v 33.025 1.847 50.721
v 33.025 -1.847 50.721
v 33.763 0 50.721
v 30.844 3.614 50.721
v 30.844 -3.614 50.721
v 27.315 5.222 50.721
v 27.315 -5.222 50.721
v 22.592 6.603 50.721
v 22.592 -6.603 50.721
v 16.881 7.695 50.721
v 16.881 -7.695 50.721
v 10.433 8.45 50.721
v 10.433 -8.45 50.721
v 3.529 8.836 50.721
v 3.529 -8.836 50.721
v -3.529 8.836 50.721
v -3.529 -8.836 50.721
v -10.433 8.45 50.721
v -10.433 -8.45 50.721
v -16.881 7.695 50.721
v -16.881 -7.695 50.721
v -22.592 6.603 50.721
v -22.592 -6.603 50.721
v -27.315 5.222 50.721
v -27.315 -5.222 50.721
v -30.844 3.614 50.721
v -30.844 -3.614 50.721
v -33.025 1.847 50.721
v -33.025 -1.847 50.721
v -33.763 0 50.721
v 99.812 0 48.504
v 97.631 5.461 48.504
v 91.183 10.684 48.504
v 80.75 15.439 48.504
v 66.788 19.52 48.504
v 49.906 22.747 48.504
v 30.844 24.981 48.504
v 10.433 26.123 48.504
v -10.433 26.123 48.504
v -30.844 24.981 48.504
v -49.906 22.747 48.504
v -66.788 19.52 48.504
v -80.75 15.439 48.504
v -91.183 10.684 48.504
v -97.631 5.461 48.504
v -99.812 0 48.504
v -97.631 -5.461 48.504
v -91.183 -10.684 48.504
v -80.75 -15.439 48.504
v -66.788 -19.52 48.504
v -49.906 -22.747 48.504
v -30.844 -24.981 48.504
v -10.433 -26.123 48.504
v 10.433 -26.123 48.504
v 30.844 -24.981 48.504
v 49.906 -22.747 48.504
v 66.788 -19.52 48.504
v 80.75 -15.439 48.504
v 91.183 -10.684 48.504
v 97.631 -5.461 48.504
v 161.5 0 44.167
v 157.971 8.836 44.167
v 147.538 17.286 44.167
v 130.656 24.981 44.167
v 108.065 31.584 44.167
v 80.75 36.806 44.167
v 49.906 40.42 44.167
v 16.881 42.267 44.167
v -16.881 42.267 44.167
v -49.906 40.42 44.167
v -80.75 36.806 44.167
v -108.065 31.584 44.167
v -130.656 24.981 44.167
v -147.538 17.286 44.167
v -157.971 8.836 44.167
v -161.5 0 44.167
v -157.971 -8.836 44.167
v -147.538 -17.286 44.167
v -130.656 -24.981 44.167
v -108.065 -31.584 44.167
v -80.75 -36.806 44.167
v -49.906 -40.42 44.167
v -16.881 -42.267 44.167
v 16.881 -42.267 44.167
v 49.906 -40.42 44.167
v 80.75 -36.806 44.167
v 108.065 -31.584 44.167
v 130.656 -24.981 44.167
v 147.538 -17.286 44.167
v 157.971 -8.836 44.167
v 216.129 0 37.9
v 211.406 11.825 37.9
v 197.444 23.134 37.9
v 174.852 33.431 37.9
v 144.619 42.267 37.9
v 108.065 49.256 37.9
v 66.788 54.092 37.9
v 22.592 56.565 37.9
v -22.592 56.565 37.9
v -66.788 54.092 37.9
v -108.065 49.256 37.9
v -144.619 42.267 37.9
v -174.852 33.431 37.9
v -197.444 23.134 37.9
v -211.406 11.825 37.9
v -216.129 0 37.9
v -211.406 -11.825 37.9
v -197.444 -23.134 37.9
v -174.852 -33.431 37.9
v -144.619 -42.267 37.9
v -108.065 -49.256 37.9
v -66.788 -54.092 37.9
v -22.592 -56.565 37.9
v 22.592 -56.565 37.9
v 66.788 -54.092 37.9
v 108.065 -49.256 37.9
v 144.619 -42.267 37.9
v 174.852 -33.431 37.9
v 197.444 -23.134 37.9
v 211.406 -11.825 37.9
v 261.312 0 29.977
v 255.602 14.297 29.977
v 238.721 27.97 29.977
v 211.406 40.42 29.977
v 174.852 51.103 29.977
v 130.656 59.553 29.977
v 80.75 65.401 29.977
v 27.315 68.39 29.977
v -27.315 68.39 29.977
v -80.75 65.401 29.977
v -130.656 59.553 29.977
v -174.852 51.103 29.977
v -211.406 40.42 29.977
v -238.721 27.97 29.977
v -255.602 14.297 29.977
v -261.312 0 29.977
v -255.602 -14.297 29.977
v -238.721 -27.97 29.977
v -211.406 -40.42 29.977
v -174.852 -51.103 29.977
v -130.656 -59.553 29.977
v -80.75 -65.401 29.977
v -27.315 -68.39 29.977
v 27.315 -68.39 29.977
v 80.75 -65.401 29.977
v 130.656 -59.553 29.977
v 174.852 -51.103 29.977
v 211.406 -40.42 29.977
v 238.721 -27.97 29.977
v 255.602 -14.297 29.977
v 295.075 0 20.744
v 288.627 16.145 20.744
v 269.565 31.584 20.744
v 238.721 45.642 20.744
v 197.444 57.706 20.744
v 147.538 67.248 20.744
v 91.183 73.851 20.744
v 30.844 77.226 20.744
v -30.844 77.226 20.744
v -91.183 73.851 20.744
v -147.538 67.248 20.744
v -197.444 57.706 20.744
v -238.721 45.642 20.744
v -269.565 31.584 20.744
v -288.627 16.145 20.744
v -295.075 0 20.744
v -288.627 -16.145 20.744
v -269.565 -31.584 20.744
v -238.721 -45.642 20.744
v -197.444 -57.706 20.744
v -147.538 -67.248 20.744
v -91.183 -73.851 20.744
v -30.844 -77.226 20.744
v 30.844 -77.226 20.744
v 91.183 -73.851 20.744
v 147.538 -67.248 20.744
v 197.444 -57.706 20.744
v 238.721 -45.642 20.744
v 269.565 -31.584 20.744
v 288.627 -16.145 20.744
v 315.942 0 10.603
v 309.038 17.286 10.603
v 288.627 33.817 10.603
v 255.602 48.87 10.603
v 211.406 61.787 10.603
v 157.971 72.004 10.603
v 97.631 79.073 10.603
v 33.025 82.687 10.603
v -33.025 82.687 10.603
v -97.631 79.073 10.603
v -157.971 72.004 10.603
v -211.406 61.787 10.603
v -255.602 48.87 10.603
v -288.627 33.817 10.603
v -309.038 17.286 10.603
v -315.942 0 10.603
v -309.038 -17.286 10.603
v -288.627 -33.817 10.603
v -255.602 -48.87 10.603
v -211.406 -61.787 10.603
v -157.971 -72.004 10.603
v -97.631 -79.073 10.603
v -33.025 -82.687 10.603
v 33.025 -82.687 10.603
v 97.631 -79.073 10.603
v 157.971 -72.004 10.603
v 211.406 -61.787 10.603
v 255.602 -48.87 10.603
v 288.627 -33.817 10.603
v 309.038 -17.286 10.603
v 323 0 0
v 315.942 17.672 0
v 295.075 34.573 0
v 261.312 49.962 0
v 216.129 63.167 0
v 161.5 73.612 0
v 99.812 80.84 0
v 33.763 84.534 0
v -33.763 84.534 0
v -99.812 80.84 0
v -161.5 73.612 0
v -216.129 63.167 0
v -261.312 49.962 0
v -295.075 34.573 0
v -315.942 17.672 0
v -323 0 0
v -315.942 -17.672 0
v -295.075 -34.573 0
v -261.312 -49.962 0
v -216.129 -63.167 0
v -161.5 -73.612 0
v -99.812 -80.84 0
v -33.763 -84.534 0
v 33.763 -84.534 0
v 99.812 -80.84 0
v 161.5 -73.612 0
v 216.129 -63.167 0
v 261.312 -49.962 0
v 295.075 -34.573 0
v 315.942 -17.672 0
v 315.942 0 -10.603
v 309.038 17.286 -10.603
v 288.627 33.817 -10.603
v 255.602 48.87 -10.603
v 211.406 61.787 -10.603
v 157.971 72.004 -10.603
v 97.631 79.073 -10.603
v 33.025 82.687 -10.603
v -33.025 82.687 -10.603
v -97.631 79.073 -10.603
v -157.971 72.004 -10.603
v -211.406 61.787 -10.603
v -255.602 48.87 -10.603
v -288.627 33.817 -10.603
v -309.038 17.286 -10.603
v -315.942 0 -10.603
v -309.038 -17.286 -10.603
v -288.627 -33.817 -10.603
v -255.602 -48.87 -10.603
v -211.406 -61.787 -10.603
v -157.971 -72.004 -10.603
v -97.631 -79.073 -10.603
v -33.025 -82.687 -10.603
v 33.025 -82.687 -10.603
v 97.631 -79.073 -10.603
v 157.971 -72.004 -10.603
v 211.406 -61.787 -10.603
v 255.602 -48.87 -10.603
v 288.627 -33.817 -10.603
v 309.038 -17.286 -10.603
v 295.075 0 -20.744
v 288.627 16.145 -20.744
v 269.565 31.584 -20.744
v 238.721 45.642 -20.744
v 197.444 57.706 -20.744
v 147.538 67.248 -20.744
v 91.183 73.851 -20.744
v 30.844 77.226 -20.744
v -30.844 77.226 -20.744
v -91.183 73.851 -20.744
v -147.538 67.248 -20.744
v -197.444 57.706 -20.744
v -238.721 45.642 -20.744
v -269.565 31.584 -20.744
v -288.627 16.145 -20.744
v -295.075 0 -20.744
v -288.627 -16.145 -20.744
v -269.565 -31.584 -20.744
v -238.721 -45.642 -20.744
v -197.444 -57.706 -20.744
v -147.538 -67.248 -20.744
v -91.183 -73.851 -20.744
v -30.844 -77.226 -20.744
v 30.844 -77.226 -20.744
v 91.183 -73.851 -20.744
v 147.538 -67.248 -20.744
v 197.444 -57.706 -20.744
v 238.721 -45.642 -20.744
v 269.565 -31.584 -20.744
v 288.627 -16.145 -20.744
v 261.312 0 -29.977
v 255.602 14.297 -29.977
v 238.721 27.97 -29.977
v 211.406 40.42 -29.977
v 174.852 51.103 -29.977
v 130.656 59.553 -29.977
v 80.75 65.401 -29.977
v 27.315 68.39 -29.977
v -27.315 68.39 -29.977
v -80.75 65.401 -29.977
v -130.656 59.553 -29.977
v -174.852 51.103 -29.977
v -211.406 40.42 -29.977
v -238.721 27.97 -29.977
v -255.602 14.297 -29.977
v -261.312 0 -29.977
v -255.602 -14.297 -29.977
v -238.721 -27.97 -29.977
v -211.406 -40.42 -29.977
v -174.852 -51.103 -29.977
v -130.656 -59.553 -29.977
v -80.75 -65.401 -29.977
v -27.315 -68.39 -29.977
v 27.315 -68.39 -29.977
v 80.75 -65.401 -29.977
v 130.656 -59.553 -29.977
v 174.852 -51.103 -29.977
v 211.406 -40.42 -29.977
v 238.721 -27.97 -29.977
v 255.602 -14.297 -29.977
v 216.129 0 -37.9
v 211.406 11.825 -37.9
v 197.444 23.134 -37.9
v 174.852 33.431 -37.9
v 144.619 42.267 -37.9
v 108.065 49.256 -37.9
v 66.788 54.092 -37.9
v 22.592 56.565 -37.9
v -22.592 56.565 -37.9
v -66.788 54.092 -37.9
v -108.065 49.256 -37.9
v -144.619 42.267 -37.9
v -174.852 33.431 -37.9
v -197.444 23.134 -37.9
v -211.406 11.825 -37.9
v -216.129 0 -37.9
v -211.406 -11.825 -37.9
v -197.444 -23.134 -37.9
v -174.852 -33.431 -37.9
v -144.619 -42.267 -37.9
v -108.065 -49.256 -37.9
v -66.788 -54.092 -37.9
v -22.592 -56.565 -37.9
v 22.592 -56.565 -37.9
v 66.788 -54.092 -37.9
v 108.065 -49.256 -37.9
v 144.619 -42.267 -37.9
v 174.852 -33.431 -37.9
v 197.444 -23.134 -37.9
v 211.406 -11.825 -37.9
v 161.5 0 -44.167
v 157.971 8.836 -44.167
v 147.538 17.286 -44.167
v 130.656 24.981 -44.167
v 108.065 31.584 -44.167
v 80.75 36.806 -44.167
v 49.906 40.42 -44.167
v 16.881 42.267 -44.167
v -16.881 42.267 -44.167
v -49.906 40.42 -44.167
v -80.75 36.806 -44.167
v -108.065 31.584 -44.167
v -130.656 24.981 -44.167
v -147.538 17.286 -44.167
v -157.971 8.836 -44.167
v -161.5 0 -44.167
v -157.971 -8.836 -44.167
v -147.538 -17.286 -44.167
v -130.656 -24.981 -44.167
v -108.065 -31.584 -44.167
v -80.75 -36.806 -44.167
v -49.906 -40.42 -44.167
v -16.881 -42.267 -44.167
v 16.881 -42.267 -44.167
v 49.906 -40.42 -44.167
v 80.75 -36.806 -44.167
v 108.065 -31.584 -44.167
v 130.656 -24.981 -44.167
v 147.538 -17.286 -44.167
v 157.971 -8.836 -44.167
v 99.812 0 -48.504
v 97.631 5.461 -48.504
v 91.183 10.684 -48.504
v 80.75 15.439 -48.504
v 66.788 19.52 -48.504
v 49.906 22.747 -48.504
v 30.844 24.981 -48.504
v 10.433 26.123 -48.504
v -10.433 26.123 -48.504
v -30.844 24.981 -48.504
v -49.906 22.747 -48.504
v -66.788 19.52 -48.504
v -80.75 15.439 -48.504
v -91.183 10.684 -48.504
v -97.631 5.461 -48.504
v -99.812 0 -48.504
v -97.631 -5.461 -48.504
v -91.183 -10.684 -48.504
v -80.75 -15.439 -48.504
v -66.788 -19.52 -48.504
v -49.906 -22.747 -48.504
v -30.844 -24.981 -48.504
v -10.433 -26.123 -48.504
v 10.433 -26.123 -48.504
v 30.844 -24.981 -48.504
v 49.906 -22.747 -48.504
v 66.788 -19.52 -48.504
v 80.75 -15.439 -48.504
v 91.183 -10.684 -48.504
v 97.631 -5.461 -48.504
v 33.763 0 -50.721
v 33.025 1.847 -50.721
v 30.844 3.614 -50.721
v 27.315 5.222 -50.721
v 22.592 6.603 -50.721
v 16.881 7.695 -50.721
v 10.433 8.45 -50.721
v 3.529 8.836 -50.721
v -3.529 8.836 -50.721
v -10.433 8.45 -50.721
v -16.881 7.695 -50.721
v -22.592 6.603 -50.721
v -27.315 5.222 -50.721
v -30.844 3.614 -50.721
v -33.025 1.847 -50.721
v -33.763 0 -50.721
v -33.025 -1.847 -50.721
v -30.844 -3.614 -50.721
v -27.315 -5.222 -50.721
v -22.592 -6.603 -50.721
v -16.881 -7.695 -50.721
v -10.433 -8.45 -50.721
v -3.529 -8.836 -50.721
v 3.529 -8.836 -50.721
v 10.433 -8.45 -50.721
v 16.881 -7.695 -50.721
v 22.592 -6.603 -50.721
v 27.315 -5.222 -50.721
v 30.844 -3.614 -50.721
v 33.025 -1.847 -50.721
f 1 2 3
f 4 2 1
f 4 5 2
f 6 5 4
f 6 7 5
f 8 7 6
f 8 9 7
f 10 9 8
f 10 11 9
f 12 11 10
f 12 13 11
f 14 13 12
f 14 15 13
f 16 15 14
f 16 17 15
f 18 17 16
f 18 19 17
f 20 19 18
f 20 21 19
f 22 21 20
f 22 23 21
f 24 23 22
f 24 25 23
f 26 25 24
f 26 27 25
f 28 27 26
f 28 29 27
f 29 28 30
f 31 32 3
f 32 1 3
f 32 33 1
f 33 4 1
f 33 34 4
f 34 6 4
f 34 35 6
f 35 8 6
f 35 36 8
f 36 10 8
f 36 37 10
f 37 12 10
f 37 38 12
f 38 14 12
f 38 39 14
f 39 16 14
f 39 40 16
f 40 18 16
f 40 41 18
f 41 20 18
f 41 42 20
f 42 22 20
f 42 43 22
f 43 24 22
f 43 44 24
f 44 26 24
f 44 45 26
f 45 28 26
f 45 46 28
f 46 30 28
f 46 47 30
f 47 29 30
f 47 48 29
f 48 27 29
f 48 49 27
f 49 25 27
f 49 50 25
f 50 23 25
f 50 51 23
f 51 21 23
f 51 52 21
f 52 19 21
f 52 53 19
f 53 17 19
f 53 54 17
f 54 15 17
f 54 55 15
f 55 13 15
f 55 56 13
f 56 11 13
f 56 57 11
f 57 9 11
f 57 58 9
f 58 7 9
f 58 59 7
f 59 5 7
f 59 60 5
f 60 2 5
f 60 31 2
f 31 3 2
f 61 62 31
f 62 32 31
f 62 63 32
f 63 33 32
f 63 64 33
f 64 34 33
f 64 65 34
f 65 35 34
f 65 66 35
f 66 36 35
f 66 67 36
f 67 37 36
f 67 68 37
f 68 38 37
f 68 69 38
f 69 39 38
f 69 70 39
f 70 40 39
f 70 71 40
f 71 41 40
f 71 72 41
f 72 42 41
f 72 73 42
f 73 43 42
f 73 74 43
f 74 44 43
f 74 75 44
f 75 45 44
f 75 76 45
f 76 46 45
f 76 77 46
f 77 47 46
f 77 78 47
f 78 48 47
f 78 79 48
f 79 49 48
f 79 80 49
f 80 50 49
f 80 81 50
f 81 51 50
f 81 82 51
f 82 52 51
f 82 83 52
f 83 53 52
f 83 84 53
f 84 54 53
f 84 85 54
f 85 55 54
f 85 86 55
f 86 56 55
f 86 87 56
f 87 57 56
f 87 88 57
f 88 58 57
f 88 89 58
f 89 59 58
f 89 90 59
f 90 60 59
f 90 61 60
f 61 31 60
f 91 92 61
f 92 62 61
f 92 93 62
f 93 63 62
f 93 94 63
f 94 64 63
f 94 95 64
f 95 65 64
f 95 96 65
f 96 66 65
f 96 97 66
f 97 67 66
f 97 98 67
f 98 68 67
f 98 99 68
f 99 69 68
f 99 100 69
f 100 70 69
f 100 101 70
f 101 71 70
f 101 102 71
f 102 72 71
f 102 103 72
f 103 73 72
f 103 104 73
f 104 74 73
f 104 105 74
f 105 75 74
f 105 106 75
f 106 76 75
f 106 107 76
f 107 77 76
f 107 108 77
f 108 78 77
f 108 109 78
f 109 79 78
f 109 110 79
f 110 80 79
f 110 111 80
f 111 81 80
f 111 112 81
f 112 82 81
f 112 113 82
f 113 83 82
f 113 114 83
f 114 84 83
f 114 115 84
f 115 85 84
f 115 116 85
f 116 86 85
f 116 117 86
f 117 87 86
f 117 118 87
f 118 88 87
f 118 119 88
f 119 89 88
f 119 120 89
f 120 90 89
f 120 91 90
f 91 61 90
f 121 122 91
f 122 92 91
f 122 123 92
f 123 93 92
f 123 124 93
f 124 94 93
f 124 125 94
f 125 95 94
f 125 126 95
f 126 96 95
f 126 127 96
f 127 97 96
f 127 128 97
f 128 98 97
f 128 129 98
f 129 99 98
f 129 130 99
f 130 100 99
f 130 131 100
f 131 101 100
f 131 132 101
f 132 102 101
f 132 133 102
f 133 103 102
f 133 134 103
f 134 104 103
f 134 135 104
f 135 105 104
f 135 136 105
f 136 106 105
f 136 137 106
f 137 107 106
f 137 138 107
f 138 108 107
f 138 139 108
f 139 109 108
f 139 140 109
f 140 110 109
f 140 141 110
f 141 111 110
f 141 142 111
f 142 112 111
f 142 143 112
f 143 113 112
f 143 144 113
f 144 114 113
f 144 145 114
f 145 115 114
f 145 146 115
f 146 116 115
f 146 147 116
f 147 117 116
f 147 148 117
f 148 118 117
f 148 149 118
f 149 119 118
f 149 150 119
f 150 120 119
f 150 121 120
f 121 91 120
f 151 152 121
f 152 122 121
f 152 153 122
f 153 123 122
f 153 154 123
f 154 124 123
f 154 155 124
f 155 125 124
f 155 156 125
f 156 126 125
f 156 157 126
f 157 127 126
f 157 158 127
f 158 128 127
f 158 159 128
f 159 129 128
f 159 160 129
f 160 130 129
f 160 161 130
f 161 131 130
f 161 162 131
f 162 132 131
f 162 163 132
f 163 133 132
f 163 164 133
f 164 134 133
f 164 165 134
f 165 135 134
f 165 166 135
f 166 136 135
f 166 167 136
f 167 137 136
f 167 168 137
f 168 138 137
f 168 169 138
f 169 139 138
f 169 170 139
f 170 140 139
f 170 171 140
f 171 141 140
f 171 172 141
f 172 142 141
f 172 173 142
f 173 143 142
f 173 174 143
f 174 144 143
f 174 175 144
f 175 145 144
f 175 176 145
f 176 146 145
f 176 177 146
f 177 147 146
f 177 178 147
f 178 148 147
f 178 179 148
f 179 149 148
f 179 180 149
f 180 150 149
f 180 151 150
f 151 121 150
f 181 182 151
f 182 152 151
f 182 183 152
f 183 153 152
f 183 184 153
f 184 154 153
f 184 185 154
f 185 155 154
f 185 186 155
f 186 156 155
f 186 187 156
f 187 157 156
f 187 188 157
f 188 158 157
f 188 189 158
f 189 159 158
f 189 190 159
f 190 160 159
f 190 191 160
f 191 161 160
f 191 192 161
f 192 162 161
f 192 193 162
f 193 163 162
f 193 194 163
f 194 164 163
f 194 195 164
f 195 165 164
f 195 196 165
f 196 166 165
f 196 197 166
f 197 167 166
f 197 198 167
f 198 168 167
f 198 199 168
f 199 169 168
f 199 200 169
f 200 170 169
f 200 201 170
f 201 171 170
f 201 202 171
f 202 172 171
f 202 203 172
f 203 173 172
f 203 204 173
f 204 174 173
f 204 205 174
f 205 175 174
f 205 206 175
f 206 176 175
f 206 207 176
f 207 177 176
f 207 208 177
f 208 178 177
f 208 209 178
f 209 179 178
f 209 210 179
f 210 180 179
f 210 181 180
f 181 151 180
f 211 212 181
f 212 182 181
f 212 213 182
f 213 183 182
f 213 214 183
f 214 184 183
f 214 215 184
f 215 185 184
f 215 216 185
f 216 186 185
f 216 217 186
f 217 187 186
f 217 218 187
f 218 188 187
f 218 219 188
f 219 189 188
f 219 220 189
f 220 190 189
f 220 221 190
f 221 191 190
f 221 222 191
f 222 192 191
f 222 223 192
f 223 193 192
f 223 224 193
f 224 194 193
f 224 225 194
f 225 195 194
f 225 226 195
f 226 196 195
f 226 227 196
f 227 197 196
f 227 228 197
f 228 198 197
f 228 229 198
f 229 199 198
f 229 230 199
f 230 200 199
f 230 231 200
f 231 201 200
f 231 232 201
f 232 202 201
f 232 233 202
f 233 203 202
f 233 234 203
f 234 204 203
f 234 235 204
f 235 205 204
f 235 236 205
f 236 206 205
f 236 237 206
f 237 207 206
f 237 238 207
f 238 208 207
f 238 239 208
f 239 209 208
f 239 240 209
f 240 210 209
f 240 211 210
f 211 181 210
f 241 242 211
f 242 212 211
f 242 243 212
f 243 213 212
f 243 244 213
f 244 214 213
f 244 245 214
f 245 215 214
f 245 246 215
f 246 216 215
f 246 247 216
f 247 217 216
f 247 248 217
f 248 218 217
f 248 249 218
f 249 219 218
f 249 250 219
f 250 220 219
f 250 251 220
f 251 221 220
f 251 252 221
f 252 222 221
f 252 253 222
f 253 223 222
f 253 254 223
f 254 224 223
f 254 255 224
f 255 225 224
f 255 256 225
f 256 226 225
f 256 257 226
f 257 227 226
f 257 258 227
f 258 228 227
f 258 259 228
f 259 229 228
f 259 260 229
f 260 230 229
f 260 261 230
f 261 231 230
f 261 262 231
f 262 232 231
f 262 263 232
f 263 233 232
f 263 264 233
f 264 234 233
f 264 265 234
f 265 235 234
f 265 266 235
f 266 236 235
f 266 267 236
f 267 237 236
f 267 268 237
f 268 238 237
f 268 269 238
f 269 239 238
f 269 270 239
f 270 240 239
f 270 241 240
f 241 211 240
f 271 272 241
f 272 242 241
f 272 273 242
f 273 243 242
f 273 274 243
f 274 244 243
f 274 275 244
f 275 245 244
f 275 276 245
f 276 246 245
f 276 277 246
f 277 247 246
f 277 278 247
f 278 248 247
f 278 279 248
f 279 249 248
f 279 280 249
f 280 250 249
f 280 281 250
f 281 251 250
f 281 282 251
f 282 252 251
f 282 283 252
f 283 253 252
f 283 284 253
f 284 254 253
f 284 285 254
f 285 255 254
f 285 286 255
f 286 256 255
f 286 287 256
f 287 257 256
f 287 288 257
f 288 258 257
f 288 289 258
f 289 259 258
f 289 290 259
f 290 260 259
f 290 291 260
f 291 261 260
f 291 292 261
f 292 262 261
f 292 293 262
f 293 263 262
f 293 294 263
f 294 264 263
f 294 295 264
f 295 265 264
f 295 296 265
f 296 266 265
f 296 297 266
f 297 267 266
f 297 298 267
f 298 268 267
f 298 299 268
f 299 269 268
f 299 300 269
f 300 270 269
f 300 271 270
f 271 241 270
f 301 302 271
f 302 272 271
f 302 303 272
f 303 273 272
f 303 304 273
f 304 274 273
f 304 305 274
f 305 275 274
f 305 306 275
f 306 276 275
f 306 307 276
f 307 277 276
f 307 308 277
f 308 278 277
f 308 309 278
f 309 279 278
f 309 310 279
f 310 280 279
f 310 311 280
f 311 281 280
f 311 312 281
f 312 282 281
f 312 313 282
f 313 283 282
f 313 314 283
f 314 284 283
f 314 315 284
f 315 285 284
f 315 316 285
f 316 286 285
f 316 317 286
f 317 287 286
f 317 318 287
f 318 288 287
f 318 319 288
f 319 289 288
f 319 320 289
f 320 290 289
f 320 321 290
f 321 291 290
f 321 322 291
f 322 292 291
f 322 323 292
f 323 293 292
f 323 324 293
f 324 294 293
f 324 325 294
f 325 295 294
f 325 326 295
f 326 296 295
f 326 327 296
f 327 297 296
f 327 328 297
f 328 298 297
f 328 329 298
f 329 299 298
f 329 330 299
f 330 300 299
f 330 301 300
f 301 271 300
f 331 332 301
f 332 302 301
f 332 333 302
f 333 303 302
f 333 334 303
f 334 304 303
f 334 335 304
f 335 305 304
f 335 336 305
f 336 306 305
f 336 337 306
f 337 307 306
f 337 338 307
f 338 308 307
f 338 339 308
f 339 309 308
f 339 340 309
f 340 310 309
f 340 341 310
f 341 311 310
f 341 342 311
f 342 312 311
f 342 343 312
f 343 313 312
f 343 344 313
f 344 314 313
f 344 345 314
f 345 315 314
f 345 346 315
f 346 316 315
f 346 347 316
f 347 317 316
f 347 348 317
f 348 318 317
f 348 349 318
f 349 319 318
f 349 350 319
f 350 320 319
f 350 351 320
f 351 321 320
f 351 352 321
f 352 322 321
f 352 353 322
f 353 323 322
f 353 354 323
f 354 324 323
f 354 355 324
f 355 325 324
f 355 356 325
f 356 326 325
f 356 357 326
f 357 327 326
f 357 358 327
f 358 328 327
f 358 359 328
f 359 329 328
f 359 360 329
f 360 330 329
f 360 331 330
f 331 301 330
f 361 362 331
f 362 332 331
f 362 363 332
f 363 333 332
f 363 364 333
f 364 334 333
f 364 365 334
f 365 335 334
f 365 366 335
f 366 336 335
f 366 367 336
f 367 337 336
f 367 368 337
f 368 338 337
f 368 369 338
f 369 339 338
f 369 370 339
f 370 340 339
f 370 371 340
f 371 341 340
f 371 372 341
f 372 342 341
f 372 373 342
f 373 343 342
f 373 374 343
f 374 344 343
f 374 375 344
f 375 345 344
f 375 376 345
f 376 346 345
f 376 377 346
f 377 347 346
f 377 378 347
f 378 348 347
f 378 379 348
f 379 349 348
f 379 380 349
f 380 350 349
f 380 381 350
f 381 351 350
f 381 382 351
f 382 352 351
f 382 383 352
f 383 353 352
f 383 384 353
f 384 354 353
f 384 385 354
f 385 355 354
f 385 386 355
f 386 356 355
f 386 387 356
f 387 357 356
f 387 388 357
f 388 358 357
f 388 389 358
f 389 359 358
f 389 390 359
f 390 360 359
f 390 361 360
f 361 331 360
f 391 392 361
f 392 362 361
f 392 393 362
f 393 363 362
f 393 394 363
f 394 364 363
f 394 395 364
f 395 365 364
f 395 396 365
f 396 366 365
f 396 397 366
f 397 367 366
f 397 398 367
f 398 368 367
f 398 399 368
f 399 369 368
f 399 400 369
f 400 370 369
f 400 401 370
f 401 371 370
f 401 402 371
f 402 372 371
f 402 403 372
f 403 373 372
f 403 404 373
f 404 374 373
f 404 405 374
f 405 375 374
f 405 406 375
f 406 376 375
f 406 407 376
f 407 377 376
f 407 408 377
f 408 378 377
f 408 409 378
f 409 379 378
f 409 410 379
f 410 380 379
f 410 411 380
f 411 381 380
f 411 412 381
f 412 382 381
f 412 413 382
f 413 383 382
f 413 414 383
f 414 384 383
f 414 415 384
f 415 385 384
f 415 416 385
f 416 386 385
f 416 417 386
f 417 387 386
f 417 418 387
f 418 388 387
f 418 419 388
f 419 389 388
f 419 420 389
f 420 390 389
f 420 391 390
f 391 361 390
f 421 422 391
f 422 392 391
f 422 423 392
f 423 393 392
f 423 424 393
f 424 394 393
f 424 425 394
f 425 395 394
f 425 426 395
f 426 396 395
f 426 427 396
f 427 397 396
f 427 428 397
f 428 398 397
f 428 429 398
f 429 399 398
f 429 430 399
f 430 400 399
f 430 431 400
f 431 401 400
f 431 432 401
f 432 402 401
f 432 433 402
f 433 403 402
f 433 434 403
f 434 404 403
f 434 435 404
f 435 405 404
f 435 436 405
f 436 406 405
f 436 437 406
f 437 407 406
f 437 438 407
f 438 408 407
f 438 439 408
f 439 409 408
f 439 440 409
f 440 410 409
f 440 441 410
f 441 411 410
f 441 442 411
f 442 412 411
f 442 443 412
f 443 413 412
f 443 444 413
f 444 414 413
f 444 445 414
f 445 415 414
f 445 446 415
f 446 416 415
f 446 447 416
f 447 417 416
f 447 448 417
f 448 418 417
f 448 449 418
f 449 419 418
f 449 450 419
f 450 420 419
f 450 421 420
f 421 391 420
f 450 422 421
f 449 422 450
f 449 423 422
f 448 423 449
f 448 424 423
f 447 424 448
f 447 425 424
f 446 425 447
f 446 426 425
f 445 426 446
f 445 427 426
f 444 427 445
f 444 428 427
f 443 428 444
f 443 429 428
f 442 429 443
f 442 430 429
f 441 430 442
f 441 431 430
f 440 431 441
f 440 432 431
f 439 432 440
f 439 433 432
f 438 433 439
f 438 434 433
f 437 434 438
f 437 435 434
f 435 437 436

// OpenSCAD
// Generated by SolidPython 1.0.1 on 2020-07-29 00:46:53


scale(v = [19, 5, 3]) {
	sphere(r = 17);
}
/***********************************************
*********      SolidPython code:      **********
************************************************
 
# import packages: SolidPython
from solid import *
from solid.utils import *
from itertools import chain, combinations, permutations


class Resize:

    def __init__(self, scad_file):
        self.scad_file = scad_file
        #self.scad_file = import_scad(scad_file)
        # cone/cylinder param:
        self.r1 = 0
        self.r2 = 0
        self.h = 0
        # rectangular prism param:
        self.w = 0
        self.l = 0
        # ellipse param:
        self.r = 0

    # import OpenScad code (file name corresponds to shape)


    # classify shape + parameters
    def assign(self, param1, param2, param3):
        if self.scad_file == 'cone.scad':
            self.r1 = param1
            self.r2 = param2
            self.h = param3
        elif self.scad_file == 'cylinder.scad':
            self.r1 = param1
            self.r2 = param2
            self.h = param3
        elif self.scad_file == 'rectangularPrism.scad':
            self.h = param1
            self.l = param2
            self.w = param3
        else:
            self.r = param1
            self.h = param2

    # resize parameters
    def iterate(self):
        x = range(3, 20, 2)
        i = 1
        if self.scad_file == 'cone.scad':
            tempList = list(permutations(x, 2))
            for temp in tempList:
                param1 = temp[0]
                param2 = temp[1]
                filepath = 'produced_scad_files/' + 'cone' + str(param1) + '_' + str(param2) + '_' + '.scad'
                scad_render_to_file(cylinder(h=param1, r1=param2, r2=0), filepath)

        elif self.scad_file == 'cylinder.scad':
            tempList = list(permutations(x, 3))
            for temp in tempList:
                param1 = temp[0]
                param2 = temp[1]
                filepath = 'produced_scad_files/' + 'cylinder' + str(param1) + '_' + str(param2) + '_' + '.scad'
                scad_render_to_file(cylinder(h=param1, r1=param2, r2=param2), filepath)

        elif self.scad_file == 'rectangularPrism.scad':
            tempList = list(permutations(x, 3))
            for temp in tempList:
                param1 = temp[0]
                param2 = temp[1]
                param3 = temp[2]
                filepath = 'produced_scad_files/' + 'rectangularPrism' + str(param1) + '_' + str(param2) + '_' + str(
                    param3) + '.scad'
                scad_render_to_file(cube(size=(param1, param2, param3)), filepath)

        elif self.scad_file == 'ellipse.scad':
            tempList = list(permutations(x, 4))
            for temp in tempList:
                param1 = temp[0]
                param2 = temp[1]
                param3 = temp[2]
                param4 = temp[3]
                filepath = 'produced_scad_files/' + 'ellipse' + str(param1) + '_' + str(param2) + '_' + str(param3) + '_' + str(param4) + '.scad'
                scad_render_to_file(scale([param1, param2, param3])(sphere(r=param4)), filepath)

    def render_to_scadfile(self):
        scad_render_to_file(scad, 'example.scad') 
 
************************************************/
